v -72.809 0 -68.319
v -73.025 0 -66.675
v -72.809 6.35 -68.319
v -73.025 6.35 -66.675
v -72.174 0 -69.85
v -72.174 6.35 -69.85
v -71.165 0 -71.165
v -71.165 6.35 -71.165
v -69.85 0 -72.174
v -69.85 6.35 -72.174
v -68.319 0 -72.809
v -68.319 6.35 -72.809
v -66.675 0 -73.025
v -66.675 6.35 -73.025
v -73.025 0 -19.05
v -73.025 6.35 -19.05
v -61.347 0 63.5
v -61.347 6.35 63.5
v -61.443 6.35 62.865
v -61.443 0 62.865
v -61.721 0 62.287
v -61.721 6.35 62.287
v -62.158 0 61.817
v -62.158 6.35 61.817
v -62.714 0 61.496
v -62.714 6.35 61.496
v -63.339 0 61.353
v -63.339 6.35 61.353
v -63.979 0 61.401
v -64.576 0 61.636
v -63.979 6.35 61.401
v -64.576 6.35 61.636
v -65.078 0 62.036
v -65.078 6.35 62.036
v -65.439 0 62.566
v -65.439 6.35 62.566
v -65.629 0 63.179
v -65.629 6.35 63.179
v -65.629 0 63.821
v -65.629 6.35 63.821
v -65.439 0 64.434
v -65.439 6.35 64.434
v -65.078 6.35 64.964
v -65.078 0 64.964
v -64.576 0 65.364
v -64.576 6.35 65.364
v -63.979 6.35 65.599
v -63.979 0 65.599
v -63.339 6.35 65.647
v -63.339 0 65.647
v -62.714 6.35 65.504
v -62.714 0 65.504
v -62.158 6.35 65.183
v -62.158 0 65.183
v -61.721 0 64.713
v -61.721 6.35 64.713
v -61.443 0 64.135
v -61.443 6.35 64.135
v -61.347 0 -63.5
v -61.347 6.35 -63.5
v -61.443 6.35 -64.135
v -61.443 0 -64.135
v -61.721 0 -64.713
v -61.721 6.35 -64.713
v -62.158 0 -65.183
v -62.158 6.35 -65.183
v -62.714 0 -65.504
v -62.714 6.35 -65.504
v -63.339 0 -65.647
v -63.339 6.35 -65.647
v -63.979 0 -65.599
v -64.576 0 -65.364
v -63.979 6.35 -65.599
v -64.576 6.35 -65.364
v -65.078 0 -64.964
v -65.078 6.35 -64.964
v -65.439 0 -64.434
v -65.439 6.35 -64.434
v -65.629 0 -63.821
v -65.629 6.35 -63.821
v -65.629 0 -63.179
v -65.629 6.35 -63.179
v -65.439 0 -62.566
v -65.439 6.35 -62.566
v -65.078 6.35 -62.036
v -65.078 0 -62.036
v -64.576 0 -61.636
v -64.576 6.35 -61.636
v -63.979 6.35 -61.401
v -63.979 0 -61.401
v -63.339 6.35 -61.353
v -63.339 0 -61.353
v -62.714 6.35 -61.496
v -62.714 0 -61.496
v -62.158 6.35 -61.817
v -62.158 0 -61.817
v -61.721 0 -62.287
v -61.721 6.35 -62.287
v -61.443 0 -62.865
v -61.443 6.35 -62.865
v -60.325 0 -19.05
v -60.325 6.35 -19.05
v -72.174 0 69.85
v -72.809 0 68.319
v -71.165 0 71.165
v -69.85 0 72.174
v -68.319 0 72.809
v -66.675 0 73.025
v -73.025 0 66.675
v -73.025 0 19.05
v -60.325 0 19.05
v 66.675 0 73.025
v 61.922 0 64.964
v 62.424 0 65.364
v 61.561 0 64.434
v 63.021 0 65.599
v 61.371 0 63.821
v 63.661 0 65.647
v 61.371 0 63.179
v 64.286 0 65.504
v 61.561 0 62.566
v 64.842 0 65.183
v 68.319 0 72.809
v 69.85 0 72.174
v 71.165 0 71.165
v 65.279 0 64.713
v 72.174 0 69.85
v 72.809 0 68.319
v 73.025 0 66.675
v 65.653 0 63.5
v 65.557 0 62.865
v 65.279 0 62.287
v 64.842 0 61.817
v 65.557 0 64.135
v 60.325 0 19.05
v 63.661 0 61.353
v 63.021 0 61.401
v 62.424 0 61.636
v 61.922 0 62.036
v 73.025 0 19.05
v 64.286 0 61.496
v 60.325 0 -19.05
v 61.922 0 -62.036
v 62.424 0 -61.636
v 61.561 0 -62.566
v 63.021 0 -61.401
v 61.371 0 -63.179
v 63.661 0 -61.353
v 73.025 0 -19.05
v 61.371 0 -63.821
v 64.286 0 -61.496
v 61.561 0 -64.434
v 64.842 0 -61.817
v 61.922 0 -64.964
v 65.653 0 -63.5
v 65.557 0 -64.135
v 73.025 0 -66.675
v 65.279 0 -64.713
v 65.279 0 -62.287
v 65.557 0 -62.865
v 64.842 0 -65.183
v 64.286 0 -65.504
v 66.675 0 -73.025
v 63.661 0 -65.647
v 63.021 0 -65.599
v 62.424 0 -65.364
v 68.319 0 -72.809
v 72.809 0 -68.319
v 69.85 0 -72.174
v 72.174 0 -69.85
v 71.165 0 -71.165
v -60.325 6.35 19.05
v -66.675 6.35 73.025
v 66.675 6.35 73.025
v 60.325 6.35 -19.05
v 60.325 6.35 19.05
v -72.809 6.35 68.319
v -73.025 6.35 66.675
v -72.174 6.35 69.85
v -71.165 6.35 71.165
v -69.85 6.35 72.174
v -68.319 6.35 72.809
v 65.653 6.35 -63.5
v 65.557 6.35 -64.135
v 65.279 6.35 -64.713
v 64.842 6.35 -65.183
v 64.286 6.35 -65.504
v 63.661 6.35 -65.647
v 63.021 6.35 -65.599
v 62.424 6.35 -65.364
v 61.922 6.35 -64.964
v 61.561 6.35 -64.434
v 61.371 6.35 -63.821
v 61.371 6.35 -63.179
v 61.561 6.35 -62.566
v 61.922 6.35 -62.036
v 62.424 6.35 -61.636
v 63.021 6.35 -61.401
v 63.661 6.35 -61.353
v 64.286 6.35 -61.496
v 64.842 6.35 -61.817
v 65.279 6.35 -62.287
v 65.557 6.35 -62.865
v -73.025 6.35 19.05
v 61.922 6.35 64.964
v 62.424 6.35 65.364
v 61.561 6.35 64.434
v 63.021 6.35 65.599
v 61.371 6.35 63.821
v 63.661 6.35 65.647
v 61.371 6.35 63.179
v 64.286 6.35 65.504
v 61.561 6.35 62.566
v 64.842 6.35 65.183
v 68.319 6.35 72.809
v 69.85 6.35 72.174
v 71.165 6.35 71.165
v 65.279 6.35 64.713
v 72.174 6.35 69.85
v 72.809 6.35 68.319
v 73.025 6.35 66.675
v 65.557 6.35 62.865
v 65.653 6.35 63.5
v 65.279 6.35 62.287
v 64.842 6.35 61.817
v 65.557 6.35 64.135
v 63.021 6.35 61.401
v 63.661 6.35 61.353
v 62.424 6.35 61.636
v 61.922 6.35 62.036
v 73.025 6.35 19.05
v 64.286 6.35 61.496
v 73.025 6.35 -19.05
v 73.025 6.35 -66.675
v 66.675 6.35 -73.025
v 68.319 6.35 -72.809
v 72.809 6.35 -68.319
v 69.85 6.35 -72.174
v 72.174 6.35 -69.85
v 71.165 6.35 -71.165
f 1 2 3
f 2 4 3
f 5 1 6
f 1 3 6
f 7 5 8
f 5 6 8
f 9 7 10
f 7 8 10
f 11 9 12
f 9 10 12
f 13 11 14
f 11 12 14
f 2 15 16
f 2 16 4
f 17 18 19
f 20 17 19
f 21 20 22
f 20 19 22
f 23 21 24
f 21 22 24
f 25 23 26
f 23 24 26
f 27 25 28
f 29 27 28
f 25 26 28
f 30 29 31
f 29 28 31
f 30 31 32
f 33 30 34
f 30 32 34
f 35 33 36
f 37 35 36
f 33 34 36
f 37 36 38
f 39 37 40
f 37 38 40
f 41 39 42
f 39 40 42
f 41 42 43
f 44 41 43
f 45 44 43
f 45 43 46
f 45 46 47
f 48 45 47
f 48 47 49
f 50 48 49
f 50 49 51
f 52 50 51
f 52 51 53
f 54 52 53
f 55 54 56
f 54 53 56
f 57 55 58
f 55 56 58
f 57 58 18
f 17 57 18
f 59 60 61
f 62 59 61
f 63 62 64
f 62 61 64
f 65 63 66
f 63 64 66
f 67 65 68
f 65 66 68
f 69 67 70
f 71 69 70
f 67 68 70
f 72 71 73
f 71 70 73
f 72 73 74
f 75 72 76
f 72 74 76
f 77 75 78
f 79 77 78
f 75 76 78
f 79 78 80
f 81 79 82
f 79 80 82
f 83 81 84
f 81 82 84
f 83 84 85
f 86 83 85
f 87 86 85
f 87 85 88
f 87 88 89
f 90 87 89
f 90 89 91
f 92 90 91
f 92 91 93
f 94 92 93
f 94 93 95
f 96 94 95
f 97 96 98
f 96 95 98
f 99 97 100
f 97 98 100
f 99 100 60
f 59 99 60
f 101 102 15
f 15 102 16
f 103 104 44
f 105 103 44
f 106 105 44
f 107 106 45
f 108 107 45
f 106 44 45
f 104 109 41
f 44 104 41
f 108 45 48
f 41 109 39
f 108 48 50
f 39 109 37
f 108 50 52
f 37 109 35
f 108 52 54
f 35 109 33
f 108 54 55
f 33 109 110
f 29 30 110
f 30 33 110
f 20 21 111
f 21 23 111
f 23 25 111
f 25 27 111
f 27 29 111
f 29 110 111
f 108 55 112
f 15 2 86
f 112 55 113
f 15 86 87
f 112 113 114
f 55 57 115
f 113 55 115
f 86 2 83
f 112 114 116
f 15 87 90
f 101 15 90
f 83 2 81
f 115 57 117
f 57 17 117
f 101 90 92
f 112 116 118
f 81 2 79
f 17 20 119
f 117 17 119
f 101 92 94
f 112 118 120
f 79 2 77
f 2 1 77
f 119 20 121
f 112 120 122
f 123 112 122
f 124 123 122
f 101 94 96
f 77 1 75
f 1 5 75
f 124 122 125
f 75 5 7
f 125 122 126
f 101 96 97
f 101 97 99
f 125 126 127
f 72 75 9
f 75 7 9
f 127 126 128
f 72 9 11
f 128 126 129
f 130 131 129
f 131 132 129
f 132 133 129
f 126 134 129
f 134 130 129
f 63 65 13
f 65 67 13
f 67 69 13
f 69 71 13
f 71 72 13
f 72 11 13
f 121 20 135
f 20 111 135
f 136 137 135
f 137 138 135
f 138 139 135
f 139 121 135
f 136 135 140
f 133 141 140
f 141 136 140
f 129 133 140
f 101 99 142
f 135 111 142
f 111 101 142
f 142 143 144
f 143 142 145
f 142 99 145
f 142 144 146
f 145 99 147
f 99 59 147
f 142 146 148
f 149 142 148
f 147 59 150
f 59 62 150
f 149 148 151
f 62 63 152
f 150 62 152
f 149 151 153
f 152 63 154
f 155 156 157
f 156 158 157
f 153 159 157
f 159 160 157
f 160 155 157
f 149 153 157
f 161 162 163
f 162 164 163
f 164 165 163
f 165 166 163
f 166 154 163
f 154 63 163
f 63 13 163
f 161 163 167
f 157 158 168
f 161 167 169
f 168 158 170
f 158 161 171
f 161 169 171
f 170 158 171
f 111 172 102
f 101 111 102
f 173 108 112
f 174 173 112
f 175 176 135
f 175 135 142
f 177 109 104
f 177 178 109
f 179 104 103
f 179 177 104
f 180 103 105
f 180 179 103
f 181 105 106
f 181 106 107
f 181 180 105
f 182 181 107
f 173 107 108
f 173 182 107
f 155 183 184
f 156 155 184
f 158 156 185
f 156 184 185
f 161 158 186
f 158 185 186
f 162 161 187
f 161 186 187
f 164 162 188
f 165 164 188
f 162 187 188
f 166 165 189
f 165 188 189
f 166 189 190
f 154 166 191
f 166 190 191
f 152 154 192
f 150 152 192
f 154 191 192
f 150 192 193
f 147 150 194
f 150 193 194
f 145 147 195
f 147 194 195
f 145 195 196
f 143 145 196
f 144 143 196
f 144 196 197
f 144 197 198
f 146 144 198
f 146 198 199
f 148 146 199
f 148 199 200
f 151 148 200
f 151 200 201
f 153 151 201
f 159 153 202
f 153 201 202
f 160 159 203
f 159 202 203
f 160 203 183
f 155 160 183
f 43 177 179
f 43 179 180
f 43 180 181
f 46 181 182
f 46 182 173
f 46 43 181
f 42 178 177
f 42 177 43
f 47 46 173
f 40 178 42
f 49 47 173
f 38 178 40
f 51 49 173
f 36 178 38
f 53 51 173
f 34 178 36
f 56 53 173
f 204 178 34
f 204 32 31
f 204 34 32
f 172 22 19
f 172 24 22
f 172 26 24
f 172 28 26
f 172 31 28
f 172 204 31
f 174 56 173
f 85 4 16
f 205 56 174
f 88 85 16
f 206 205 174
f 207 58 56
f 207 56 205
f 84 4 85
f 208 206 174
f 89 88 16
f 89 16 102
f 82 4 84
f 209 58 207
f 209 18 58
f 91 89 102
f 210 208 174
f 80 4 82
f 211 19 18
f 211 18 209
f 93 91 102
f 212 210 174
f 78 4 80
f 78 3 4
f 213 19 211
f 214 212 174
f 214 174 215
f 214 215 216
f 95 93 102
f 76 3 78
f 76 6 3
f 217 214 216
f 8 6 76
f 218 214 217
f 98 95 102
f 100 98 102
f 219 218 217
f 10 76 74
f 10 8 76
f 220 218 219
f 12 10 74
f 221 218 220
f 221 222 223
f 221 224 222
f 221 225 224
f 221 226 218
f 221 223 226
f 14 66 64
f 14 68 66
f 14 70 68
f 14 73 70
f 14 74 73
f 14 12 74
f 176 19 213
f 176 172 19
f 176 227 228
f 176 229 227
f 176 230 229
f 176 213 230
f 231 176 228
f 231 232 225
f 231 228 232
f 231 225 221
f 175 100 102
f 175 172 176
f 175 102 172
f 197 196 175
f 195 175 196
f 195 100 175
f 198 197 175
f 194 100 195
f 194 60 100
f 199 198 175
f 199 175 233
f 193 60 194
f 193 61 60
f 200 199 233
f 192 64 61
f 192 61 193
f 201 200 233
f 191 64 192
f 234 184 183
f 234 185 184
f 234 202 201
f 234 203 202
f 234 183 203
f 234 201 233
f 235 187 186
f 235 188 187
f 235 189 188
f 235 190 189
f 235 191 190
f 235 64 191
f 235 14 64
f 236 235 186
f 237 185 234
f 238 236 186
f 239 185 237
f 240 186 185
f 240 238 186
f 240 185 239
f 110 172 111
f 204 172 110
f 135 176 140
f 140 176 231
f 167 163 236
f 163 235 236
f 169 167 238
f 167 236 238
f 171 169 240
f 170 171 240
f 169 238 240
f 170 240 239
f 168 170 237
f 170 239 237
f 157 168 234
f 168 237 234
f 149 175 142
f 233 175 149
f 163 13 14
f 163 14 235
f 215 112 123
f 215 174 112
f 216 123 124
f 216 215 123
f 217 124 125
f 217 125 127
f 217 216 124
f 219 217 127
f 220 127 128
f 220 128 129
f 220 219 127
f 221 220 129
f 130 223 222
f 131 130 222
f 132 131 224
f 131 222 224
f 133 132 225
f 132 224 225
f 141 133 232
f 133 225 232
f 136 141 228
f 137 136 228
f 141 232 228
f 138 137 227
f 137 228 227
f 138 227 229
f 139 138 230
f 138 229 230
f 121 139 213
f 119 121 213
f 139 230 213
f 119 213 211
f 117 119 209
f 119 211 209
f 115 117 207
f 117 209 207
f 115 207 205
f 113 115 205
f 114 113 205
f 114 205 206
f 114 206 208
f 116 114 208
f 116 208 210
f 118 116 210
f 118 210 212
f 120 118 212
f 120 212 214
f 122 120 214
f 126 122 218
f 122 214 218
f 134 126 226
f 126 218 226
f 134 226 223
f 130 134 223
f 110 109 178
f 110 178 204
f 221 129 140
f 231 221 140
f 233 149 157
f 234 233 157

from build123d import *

# Parameters (mm, degrees)
SKETCH1_W           = 146.05
SKETCH1_H           = 146.05
BOSS_EXTRUDE1_DEPTH = 6.35
SKETCH2_R           = 2.15265
CUT_EXTRUDE1_DEPTH  = 6.35
FILLET1_R           = 6.35
SKETCH3_W           = 12.7
SKETCH3_H           = 38.1
CUT_EXTRUDE2_DEPTH  = 6.35


with BuildPart() as part:
    # Sketch1 → Boss-Extrude1 (new body)
    with BuildSketch(Plane(origin=(0, 0, 0), x_dir=(1, 0, 0), z_dir=(0, 1, 0))):
        Rectangle(SKETCH1_W, SKETCH1_H)
    extrude(amount=BOSS_EXTRUDE1_DEPTH)

    # Sketch2 → Cut-Extrude1 (cut)
    with BuildSketch(Plane(origin=(0, 6.35, 0), x_dir=(1, 0, 0), z_dir=(0, 1, 0))):
        with Locations((-63.5, 63.5)):
            Circle(SKETCH2_R)
        with Locations((63.5, 63.5)):
            Circle(SKETCH2_R)
        with Locations((63.5, -63.5)):
            Circle(SKETCH2_R)
        with Locations((-63.5, -63.5)):
            Circle(SKETCH2_R)
    extrude(amount=-CUT_EXTRUDE1_DEPTH, mode=Mode.SUBTRACT)

    # Fillet1
    fillet1_edges = [part.edges().sort_by_distance(p)[0] for p in [
        (73.025, 3.175, 73.025),
        (-73.025, 3.175, 73.025),
        (-73.025, 3.175, -73.025),
        (73.025, 3.175, -73.025),
    ]]
    fillet(fillet1_edges, radius=FILLET1_R)

    # Sketch3 → Cut-Extrude2 (cut)
    with BuildSketch(Plane(origin=(0, 6.35, 0), x_dir=(1, 0, 0), z_dir=(0, 1, 0))):
        with Locations((66.675, 0)):
            Rectangle(SKETCH3_W, SKETCH3_H)
    cut_extrude2 = extrude(amount=-CUT_EXTRUDE2_DEPTH, mode=Mode.SUBTRACT)

    # Mirror1: Cut-Extrude2 across plane
    add(cut_extrude2.mirror(Plane(origin=(0, 0, 0), x_dir=(0, 0, 1), z_dir=(1, 0, 0))), mode=Mode.SUBTRACT)


solid = part.part
